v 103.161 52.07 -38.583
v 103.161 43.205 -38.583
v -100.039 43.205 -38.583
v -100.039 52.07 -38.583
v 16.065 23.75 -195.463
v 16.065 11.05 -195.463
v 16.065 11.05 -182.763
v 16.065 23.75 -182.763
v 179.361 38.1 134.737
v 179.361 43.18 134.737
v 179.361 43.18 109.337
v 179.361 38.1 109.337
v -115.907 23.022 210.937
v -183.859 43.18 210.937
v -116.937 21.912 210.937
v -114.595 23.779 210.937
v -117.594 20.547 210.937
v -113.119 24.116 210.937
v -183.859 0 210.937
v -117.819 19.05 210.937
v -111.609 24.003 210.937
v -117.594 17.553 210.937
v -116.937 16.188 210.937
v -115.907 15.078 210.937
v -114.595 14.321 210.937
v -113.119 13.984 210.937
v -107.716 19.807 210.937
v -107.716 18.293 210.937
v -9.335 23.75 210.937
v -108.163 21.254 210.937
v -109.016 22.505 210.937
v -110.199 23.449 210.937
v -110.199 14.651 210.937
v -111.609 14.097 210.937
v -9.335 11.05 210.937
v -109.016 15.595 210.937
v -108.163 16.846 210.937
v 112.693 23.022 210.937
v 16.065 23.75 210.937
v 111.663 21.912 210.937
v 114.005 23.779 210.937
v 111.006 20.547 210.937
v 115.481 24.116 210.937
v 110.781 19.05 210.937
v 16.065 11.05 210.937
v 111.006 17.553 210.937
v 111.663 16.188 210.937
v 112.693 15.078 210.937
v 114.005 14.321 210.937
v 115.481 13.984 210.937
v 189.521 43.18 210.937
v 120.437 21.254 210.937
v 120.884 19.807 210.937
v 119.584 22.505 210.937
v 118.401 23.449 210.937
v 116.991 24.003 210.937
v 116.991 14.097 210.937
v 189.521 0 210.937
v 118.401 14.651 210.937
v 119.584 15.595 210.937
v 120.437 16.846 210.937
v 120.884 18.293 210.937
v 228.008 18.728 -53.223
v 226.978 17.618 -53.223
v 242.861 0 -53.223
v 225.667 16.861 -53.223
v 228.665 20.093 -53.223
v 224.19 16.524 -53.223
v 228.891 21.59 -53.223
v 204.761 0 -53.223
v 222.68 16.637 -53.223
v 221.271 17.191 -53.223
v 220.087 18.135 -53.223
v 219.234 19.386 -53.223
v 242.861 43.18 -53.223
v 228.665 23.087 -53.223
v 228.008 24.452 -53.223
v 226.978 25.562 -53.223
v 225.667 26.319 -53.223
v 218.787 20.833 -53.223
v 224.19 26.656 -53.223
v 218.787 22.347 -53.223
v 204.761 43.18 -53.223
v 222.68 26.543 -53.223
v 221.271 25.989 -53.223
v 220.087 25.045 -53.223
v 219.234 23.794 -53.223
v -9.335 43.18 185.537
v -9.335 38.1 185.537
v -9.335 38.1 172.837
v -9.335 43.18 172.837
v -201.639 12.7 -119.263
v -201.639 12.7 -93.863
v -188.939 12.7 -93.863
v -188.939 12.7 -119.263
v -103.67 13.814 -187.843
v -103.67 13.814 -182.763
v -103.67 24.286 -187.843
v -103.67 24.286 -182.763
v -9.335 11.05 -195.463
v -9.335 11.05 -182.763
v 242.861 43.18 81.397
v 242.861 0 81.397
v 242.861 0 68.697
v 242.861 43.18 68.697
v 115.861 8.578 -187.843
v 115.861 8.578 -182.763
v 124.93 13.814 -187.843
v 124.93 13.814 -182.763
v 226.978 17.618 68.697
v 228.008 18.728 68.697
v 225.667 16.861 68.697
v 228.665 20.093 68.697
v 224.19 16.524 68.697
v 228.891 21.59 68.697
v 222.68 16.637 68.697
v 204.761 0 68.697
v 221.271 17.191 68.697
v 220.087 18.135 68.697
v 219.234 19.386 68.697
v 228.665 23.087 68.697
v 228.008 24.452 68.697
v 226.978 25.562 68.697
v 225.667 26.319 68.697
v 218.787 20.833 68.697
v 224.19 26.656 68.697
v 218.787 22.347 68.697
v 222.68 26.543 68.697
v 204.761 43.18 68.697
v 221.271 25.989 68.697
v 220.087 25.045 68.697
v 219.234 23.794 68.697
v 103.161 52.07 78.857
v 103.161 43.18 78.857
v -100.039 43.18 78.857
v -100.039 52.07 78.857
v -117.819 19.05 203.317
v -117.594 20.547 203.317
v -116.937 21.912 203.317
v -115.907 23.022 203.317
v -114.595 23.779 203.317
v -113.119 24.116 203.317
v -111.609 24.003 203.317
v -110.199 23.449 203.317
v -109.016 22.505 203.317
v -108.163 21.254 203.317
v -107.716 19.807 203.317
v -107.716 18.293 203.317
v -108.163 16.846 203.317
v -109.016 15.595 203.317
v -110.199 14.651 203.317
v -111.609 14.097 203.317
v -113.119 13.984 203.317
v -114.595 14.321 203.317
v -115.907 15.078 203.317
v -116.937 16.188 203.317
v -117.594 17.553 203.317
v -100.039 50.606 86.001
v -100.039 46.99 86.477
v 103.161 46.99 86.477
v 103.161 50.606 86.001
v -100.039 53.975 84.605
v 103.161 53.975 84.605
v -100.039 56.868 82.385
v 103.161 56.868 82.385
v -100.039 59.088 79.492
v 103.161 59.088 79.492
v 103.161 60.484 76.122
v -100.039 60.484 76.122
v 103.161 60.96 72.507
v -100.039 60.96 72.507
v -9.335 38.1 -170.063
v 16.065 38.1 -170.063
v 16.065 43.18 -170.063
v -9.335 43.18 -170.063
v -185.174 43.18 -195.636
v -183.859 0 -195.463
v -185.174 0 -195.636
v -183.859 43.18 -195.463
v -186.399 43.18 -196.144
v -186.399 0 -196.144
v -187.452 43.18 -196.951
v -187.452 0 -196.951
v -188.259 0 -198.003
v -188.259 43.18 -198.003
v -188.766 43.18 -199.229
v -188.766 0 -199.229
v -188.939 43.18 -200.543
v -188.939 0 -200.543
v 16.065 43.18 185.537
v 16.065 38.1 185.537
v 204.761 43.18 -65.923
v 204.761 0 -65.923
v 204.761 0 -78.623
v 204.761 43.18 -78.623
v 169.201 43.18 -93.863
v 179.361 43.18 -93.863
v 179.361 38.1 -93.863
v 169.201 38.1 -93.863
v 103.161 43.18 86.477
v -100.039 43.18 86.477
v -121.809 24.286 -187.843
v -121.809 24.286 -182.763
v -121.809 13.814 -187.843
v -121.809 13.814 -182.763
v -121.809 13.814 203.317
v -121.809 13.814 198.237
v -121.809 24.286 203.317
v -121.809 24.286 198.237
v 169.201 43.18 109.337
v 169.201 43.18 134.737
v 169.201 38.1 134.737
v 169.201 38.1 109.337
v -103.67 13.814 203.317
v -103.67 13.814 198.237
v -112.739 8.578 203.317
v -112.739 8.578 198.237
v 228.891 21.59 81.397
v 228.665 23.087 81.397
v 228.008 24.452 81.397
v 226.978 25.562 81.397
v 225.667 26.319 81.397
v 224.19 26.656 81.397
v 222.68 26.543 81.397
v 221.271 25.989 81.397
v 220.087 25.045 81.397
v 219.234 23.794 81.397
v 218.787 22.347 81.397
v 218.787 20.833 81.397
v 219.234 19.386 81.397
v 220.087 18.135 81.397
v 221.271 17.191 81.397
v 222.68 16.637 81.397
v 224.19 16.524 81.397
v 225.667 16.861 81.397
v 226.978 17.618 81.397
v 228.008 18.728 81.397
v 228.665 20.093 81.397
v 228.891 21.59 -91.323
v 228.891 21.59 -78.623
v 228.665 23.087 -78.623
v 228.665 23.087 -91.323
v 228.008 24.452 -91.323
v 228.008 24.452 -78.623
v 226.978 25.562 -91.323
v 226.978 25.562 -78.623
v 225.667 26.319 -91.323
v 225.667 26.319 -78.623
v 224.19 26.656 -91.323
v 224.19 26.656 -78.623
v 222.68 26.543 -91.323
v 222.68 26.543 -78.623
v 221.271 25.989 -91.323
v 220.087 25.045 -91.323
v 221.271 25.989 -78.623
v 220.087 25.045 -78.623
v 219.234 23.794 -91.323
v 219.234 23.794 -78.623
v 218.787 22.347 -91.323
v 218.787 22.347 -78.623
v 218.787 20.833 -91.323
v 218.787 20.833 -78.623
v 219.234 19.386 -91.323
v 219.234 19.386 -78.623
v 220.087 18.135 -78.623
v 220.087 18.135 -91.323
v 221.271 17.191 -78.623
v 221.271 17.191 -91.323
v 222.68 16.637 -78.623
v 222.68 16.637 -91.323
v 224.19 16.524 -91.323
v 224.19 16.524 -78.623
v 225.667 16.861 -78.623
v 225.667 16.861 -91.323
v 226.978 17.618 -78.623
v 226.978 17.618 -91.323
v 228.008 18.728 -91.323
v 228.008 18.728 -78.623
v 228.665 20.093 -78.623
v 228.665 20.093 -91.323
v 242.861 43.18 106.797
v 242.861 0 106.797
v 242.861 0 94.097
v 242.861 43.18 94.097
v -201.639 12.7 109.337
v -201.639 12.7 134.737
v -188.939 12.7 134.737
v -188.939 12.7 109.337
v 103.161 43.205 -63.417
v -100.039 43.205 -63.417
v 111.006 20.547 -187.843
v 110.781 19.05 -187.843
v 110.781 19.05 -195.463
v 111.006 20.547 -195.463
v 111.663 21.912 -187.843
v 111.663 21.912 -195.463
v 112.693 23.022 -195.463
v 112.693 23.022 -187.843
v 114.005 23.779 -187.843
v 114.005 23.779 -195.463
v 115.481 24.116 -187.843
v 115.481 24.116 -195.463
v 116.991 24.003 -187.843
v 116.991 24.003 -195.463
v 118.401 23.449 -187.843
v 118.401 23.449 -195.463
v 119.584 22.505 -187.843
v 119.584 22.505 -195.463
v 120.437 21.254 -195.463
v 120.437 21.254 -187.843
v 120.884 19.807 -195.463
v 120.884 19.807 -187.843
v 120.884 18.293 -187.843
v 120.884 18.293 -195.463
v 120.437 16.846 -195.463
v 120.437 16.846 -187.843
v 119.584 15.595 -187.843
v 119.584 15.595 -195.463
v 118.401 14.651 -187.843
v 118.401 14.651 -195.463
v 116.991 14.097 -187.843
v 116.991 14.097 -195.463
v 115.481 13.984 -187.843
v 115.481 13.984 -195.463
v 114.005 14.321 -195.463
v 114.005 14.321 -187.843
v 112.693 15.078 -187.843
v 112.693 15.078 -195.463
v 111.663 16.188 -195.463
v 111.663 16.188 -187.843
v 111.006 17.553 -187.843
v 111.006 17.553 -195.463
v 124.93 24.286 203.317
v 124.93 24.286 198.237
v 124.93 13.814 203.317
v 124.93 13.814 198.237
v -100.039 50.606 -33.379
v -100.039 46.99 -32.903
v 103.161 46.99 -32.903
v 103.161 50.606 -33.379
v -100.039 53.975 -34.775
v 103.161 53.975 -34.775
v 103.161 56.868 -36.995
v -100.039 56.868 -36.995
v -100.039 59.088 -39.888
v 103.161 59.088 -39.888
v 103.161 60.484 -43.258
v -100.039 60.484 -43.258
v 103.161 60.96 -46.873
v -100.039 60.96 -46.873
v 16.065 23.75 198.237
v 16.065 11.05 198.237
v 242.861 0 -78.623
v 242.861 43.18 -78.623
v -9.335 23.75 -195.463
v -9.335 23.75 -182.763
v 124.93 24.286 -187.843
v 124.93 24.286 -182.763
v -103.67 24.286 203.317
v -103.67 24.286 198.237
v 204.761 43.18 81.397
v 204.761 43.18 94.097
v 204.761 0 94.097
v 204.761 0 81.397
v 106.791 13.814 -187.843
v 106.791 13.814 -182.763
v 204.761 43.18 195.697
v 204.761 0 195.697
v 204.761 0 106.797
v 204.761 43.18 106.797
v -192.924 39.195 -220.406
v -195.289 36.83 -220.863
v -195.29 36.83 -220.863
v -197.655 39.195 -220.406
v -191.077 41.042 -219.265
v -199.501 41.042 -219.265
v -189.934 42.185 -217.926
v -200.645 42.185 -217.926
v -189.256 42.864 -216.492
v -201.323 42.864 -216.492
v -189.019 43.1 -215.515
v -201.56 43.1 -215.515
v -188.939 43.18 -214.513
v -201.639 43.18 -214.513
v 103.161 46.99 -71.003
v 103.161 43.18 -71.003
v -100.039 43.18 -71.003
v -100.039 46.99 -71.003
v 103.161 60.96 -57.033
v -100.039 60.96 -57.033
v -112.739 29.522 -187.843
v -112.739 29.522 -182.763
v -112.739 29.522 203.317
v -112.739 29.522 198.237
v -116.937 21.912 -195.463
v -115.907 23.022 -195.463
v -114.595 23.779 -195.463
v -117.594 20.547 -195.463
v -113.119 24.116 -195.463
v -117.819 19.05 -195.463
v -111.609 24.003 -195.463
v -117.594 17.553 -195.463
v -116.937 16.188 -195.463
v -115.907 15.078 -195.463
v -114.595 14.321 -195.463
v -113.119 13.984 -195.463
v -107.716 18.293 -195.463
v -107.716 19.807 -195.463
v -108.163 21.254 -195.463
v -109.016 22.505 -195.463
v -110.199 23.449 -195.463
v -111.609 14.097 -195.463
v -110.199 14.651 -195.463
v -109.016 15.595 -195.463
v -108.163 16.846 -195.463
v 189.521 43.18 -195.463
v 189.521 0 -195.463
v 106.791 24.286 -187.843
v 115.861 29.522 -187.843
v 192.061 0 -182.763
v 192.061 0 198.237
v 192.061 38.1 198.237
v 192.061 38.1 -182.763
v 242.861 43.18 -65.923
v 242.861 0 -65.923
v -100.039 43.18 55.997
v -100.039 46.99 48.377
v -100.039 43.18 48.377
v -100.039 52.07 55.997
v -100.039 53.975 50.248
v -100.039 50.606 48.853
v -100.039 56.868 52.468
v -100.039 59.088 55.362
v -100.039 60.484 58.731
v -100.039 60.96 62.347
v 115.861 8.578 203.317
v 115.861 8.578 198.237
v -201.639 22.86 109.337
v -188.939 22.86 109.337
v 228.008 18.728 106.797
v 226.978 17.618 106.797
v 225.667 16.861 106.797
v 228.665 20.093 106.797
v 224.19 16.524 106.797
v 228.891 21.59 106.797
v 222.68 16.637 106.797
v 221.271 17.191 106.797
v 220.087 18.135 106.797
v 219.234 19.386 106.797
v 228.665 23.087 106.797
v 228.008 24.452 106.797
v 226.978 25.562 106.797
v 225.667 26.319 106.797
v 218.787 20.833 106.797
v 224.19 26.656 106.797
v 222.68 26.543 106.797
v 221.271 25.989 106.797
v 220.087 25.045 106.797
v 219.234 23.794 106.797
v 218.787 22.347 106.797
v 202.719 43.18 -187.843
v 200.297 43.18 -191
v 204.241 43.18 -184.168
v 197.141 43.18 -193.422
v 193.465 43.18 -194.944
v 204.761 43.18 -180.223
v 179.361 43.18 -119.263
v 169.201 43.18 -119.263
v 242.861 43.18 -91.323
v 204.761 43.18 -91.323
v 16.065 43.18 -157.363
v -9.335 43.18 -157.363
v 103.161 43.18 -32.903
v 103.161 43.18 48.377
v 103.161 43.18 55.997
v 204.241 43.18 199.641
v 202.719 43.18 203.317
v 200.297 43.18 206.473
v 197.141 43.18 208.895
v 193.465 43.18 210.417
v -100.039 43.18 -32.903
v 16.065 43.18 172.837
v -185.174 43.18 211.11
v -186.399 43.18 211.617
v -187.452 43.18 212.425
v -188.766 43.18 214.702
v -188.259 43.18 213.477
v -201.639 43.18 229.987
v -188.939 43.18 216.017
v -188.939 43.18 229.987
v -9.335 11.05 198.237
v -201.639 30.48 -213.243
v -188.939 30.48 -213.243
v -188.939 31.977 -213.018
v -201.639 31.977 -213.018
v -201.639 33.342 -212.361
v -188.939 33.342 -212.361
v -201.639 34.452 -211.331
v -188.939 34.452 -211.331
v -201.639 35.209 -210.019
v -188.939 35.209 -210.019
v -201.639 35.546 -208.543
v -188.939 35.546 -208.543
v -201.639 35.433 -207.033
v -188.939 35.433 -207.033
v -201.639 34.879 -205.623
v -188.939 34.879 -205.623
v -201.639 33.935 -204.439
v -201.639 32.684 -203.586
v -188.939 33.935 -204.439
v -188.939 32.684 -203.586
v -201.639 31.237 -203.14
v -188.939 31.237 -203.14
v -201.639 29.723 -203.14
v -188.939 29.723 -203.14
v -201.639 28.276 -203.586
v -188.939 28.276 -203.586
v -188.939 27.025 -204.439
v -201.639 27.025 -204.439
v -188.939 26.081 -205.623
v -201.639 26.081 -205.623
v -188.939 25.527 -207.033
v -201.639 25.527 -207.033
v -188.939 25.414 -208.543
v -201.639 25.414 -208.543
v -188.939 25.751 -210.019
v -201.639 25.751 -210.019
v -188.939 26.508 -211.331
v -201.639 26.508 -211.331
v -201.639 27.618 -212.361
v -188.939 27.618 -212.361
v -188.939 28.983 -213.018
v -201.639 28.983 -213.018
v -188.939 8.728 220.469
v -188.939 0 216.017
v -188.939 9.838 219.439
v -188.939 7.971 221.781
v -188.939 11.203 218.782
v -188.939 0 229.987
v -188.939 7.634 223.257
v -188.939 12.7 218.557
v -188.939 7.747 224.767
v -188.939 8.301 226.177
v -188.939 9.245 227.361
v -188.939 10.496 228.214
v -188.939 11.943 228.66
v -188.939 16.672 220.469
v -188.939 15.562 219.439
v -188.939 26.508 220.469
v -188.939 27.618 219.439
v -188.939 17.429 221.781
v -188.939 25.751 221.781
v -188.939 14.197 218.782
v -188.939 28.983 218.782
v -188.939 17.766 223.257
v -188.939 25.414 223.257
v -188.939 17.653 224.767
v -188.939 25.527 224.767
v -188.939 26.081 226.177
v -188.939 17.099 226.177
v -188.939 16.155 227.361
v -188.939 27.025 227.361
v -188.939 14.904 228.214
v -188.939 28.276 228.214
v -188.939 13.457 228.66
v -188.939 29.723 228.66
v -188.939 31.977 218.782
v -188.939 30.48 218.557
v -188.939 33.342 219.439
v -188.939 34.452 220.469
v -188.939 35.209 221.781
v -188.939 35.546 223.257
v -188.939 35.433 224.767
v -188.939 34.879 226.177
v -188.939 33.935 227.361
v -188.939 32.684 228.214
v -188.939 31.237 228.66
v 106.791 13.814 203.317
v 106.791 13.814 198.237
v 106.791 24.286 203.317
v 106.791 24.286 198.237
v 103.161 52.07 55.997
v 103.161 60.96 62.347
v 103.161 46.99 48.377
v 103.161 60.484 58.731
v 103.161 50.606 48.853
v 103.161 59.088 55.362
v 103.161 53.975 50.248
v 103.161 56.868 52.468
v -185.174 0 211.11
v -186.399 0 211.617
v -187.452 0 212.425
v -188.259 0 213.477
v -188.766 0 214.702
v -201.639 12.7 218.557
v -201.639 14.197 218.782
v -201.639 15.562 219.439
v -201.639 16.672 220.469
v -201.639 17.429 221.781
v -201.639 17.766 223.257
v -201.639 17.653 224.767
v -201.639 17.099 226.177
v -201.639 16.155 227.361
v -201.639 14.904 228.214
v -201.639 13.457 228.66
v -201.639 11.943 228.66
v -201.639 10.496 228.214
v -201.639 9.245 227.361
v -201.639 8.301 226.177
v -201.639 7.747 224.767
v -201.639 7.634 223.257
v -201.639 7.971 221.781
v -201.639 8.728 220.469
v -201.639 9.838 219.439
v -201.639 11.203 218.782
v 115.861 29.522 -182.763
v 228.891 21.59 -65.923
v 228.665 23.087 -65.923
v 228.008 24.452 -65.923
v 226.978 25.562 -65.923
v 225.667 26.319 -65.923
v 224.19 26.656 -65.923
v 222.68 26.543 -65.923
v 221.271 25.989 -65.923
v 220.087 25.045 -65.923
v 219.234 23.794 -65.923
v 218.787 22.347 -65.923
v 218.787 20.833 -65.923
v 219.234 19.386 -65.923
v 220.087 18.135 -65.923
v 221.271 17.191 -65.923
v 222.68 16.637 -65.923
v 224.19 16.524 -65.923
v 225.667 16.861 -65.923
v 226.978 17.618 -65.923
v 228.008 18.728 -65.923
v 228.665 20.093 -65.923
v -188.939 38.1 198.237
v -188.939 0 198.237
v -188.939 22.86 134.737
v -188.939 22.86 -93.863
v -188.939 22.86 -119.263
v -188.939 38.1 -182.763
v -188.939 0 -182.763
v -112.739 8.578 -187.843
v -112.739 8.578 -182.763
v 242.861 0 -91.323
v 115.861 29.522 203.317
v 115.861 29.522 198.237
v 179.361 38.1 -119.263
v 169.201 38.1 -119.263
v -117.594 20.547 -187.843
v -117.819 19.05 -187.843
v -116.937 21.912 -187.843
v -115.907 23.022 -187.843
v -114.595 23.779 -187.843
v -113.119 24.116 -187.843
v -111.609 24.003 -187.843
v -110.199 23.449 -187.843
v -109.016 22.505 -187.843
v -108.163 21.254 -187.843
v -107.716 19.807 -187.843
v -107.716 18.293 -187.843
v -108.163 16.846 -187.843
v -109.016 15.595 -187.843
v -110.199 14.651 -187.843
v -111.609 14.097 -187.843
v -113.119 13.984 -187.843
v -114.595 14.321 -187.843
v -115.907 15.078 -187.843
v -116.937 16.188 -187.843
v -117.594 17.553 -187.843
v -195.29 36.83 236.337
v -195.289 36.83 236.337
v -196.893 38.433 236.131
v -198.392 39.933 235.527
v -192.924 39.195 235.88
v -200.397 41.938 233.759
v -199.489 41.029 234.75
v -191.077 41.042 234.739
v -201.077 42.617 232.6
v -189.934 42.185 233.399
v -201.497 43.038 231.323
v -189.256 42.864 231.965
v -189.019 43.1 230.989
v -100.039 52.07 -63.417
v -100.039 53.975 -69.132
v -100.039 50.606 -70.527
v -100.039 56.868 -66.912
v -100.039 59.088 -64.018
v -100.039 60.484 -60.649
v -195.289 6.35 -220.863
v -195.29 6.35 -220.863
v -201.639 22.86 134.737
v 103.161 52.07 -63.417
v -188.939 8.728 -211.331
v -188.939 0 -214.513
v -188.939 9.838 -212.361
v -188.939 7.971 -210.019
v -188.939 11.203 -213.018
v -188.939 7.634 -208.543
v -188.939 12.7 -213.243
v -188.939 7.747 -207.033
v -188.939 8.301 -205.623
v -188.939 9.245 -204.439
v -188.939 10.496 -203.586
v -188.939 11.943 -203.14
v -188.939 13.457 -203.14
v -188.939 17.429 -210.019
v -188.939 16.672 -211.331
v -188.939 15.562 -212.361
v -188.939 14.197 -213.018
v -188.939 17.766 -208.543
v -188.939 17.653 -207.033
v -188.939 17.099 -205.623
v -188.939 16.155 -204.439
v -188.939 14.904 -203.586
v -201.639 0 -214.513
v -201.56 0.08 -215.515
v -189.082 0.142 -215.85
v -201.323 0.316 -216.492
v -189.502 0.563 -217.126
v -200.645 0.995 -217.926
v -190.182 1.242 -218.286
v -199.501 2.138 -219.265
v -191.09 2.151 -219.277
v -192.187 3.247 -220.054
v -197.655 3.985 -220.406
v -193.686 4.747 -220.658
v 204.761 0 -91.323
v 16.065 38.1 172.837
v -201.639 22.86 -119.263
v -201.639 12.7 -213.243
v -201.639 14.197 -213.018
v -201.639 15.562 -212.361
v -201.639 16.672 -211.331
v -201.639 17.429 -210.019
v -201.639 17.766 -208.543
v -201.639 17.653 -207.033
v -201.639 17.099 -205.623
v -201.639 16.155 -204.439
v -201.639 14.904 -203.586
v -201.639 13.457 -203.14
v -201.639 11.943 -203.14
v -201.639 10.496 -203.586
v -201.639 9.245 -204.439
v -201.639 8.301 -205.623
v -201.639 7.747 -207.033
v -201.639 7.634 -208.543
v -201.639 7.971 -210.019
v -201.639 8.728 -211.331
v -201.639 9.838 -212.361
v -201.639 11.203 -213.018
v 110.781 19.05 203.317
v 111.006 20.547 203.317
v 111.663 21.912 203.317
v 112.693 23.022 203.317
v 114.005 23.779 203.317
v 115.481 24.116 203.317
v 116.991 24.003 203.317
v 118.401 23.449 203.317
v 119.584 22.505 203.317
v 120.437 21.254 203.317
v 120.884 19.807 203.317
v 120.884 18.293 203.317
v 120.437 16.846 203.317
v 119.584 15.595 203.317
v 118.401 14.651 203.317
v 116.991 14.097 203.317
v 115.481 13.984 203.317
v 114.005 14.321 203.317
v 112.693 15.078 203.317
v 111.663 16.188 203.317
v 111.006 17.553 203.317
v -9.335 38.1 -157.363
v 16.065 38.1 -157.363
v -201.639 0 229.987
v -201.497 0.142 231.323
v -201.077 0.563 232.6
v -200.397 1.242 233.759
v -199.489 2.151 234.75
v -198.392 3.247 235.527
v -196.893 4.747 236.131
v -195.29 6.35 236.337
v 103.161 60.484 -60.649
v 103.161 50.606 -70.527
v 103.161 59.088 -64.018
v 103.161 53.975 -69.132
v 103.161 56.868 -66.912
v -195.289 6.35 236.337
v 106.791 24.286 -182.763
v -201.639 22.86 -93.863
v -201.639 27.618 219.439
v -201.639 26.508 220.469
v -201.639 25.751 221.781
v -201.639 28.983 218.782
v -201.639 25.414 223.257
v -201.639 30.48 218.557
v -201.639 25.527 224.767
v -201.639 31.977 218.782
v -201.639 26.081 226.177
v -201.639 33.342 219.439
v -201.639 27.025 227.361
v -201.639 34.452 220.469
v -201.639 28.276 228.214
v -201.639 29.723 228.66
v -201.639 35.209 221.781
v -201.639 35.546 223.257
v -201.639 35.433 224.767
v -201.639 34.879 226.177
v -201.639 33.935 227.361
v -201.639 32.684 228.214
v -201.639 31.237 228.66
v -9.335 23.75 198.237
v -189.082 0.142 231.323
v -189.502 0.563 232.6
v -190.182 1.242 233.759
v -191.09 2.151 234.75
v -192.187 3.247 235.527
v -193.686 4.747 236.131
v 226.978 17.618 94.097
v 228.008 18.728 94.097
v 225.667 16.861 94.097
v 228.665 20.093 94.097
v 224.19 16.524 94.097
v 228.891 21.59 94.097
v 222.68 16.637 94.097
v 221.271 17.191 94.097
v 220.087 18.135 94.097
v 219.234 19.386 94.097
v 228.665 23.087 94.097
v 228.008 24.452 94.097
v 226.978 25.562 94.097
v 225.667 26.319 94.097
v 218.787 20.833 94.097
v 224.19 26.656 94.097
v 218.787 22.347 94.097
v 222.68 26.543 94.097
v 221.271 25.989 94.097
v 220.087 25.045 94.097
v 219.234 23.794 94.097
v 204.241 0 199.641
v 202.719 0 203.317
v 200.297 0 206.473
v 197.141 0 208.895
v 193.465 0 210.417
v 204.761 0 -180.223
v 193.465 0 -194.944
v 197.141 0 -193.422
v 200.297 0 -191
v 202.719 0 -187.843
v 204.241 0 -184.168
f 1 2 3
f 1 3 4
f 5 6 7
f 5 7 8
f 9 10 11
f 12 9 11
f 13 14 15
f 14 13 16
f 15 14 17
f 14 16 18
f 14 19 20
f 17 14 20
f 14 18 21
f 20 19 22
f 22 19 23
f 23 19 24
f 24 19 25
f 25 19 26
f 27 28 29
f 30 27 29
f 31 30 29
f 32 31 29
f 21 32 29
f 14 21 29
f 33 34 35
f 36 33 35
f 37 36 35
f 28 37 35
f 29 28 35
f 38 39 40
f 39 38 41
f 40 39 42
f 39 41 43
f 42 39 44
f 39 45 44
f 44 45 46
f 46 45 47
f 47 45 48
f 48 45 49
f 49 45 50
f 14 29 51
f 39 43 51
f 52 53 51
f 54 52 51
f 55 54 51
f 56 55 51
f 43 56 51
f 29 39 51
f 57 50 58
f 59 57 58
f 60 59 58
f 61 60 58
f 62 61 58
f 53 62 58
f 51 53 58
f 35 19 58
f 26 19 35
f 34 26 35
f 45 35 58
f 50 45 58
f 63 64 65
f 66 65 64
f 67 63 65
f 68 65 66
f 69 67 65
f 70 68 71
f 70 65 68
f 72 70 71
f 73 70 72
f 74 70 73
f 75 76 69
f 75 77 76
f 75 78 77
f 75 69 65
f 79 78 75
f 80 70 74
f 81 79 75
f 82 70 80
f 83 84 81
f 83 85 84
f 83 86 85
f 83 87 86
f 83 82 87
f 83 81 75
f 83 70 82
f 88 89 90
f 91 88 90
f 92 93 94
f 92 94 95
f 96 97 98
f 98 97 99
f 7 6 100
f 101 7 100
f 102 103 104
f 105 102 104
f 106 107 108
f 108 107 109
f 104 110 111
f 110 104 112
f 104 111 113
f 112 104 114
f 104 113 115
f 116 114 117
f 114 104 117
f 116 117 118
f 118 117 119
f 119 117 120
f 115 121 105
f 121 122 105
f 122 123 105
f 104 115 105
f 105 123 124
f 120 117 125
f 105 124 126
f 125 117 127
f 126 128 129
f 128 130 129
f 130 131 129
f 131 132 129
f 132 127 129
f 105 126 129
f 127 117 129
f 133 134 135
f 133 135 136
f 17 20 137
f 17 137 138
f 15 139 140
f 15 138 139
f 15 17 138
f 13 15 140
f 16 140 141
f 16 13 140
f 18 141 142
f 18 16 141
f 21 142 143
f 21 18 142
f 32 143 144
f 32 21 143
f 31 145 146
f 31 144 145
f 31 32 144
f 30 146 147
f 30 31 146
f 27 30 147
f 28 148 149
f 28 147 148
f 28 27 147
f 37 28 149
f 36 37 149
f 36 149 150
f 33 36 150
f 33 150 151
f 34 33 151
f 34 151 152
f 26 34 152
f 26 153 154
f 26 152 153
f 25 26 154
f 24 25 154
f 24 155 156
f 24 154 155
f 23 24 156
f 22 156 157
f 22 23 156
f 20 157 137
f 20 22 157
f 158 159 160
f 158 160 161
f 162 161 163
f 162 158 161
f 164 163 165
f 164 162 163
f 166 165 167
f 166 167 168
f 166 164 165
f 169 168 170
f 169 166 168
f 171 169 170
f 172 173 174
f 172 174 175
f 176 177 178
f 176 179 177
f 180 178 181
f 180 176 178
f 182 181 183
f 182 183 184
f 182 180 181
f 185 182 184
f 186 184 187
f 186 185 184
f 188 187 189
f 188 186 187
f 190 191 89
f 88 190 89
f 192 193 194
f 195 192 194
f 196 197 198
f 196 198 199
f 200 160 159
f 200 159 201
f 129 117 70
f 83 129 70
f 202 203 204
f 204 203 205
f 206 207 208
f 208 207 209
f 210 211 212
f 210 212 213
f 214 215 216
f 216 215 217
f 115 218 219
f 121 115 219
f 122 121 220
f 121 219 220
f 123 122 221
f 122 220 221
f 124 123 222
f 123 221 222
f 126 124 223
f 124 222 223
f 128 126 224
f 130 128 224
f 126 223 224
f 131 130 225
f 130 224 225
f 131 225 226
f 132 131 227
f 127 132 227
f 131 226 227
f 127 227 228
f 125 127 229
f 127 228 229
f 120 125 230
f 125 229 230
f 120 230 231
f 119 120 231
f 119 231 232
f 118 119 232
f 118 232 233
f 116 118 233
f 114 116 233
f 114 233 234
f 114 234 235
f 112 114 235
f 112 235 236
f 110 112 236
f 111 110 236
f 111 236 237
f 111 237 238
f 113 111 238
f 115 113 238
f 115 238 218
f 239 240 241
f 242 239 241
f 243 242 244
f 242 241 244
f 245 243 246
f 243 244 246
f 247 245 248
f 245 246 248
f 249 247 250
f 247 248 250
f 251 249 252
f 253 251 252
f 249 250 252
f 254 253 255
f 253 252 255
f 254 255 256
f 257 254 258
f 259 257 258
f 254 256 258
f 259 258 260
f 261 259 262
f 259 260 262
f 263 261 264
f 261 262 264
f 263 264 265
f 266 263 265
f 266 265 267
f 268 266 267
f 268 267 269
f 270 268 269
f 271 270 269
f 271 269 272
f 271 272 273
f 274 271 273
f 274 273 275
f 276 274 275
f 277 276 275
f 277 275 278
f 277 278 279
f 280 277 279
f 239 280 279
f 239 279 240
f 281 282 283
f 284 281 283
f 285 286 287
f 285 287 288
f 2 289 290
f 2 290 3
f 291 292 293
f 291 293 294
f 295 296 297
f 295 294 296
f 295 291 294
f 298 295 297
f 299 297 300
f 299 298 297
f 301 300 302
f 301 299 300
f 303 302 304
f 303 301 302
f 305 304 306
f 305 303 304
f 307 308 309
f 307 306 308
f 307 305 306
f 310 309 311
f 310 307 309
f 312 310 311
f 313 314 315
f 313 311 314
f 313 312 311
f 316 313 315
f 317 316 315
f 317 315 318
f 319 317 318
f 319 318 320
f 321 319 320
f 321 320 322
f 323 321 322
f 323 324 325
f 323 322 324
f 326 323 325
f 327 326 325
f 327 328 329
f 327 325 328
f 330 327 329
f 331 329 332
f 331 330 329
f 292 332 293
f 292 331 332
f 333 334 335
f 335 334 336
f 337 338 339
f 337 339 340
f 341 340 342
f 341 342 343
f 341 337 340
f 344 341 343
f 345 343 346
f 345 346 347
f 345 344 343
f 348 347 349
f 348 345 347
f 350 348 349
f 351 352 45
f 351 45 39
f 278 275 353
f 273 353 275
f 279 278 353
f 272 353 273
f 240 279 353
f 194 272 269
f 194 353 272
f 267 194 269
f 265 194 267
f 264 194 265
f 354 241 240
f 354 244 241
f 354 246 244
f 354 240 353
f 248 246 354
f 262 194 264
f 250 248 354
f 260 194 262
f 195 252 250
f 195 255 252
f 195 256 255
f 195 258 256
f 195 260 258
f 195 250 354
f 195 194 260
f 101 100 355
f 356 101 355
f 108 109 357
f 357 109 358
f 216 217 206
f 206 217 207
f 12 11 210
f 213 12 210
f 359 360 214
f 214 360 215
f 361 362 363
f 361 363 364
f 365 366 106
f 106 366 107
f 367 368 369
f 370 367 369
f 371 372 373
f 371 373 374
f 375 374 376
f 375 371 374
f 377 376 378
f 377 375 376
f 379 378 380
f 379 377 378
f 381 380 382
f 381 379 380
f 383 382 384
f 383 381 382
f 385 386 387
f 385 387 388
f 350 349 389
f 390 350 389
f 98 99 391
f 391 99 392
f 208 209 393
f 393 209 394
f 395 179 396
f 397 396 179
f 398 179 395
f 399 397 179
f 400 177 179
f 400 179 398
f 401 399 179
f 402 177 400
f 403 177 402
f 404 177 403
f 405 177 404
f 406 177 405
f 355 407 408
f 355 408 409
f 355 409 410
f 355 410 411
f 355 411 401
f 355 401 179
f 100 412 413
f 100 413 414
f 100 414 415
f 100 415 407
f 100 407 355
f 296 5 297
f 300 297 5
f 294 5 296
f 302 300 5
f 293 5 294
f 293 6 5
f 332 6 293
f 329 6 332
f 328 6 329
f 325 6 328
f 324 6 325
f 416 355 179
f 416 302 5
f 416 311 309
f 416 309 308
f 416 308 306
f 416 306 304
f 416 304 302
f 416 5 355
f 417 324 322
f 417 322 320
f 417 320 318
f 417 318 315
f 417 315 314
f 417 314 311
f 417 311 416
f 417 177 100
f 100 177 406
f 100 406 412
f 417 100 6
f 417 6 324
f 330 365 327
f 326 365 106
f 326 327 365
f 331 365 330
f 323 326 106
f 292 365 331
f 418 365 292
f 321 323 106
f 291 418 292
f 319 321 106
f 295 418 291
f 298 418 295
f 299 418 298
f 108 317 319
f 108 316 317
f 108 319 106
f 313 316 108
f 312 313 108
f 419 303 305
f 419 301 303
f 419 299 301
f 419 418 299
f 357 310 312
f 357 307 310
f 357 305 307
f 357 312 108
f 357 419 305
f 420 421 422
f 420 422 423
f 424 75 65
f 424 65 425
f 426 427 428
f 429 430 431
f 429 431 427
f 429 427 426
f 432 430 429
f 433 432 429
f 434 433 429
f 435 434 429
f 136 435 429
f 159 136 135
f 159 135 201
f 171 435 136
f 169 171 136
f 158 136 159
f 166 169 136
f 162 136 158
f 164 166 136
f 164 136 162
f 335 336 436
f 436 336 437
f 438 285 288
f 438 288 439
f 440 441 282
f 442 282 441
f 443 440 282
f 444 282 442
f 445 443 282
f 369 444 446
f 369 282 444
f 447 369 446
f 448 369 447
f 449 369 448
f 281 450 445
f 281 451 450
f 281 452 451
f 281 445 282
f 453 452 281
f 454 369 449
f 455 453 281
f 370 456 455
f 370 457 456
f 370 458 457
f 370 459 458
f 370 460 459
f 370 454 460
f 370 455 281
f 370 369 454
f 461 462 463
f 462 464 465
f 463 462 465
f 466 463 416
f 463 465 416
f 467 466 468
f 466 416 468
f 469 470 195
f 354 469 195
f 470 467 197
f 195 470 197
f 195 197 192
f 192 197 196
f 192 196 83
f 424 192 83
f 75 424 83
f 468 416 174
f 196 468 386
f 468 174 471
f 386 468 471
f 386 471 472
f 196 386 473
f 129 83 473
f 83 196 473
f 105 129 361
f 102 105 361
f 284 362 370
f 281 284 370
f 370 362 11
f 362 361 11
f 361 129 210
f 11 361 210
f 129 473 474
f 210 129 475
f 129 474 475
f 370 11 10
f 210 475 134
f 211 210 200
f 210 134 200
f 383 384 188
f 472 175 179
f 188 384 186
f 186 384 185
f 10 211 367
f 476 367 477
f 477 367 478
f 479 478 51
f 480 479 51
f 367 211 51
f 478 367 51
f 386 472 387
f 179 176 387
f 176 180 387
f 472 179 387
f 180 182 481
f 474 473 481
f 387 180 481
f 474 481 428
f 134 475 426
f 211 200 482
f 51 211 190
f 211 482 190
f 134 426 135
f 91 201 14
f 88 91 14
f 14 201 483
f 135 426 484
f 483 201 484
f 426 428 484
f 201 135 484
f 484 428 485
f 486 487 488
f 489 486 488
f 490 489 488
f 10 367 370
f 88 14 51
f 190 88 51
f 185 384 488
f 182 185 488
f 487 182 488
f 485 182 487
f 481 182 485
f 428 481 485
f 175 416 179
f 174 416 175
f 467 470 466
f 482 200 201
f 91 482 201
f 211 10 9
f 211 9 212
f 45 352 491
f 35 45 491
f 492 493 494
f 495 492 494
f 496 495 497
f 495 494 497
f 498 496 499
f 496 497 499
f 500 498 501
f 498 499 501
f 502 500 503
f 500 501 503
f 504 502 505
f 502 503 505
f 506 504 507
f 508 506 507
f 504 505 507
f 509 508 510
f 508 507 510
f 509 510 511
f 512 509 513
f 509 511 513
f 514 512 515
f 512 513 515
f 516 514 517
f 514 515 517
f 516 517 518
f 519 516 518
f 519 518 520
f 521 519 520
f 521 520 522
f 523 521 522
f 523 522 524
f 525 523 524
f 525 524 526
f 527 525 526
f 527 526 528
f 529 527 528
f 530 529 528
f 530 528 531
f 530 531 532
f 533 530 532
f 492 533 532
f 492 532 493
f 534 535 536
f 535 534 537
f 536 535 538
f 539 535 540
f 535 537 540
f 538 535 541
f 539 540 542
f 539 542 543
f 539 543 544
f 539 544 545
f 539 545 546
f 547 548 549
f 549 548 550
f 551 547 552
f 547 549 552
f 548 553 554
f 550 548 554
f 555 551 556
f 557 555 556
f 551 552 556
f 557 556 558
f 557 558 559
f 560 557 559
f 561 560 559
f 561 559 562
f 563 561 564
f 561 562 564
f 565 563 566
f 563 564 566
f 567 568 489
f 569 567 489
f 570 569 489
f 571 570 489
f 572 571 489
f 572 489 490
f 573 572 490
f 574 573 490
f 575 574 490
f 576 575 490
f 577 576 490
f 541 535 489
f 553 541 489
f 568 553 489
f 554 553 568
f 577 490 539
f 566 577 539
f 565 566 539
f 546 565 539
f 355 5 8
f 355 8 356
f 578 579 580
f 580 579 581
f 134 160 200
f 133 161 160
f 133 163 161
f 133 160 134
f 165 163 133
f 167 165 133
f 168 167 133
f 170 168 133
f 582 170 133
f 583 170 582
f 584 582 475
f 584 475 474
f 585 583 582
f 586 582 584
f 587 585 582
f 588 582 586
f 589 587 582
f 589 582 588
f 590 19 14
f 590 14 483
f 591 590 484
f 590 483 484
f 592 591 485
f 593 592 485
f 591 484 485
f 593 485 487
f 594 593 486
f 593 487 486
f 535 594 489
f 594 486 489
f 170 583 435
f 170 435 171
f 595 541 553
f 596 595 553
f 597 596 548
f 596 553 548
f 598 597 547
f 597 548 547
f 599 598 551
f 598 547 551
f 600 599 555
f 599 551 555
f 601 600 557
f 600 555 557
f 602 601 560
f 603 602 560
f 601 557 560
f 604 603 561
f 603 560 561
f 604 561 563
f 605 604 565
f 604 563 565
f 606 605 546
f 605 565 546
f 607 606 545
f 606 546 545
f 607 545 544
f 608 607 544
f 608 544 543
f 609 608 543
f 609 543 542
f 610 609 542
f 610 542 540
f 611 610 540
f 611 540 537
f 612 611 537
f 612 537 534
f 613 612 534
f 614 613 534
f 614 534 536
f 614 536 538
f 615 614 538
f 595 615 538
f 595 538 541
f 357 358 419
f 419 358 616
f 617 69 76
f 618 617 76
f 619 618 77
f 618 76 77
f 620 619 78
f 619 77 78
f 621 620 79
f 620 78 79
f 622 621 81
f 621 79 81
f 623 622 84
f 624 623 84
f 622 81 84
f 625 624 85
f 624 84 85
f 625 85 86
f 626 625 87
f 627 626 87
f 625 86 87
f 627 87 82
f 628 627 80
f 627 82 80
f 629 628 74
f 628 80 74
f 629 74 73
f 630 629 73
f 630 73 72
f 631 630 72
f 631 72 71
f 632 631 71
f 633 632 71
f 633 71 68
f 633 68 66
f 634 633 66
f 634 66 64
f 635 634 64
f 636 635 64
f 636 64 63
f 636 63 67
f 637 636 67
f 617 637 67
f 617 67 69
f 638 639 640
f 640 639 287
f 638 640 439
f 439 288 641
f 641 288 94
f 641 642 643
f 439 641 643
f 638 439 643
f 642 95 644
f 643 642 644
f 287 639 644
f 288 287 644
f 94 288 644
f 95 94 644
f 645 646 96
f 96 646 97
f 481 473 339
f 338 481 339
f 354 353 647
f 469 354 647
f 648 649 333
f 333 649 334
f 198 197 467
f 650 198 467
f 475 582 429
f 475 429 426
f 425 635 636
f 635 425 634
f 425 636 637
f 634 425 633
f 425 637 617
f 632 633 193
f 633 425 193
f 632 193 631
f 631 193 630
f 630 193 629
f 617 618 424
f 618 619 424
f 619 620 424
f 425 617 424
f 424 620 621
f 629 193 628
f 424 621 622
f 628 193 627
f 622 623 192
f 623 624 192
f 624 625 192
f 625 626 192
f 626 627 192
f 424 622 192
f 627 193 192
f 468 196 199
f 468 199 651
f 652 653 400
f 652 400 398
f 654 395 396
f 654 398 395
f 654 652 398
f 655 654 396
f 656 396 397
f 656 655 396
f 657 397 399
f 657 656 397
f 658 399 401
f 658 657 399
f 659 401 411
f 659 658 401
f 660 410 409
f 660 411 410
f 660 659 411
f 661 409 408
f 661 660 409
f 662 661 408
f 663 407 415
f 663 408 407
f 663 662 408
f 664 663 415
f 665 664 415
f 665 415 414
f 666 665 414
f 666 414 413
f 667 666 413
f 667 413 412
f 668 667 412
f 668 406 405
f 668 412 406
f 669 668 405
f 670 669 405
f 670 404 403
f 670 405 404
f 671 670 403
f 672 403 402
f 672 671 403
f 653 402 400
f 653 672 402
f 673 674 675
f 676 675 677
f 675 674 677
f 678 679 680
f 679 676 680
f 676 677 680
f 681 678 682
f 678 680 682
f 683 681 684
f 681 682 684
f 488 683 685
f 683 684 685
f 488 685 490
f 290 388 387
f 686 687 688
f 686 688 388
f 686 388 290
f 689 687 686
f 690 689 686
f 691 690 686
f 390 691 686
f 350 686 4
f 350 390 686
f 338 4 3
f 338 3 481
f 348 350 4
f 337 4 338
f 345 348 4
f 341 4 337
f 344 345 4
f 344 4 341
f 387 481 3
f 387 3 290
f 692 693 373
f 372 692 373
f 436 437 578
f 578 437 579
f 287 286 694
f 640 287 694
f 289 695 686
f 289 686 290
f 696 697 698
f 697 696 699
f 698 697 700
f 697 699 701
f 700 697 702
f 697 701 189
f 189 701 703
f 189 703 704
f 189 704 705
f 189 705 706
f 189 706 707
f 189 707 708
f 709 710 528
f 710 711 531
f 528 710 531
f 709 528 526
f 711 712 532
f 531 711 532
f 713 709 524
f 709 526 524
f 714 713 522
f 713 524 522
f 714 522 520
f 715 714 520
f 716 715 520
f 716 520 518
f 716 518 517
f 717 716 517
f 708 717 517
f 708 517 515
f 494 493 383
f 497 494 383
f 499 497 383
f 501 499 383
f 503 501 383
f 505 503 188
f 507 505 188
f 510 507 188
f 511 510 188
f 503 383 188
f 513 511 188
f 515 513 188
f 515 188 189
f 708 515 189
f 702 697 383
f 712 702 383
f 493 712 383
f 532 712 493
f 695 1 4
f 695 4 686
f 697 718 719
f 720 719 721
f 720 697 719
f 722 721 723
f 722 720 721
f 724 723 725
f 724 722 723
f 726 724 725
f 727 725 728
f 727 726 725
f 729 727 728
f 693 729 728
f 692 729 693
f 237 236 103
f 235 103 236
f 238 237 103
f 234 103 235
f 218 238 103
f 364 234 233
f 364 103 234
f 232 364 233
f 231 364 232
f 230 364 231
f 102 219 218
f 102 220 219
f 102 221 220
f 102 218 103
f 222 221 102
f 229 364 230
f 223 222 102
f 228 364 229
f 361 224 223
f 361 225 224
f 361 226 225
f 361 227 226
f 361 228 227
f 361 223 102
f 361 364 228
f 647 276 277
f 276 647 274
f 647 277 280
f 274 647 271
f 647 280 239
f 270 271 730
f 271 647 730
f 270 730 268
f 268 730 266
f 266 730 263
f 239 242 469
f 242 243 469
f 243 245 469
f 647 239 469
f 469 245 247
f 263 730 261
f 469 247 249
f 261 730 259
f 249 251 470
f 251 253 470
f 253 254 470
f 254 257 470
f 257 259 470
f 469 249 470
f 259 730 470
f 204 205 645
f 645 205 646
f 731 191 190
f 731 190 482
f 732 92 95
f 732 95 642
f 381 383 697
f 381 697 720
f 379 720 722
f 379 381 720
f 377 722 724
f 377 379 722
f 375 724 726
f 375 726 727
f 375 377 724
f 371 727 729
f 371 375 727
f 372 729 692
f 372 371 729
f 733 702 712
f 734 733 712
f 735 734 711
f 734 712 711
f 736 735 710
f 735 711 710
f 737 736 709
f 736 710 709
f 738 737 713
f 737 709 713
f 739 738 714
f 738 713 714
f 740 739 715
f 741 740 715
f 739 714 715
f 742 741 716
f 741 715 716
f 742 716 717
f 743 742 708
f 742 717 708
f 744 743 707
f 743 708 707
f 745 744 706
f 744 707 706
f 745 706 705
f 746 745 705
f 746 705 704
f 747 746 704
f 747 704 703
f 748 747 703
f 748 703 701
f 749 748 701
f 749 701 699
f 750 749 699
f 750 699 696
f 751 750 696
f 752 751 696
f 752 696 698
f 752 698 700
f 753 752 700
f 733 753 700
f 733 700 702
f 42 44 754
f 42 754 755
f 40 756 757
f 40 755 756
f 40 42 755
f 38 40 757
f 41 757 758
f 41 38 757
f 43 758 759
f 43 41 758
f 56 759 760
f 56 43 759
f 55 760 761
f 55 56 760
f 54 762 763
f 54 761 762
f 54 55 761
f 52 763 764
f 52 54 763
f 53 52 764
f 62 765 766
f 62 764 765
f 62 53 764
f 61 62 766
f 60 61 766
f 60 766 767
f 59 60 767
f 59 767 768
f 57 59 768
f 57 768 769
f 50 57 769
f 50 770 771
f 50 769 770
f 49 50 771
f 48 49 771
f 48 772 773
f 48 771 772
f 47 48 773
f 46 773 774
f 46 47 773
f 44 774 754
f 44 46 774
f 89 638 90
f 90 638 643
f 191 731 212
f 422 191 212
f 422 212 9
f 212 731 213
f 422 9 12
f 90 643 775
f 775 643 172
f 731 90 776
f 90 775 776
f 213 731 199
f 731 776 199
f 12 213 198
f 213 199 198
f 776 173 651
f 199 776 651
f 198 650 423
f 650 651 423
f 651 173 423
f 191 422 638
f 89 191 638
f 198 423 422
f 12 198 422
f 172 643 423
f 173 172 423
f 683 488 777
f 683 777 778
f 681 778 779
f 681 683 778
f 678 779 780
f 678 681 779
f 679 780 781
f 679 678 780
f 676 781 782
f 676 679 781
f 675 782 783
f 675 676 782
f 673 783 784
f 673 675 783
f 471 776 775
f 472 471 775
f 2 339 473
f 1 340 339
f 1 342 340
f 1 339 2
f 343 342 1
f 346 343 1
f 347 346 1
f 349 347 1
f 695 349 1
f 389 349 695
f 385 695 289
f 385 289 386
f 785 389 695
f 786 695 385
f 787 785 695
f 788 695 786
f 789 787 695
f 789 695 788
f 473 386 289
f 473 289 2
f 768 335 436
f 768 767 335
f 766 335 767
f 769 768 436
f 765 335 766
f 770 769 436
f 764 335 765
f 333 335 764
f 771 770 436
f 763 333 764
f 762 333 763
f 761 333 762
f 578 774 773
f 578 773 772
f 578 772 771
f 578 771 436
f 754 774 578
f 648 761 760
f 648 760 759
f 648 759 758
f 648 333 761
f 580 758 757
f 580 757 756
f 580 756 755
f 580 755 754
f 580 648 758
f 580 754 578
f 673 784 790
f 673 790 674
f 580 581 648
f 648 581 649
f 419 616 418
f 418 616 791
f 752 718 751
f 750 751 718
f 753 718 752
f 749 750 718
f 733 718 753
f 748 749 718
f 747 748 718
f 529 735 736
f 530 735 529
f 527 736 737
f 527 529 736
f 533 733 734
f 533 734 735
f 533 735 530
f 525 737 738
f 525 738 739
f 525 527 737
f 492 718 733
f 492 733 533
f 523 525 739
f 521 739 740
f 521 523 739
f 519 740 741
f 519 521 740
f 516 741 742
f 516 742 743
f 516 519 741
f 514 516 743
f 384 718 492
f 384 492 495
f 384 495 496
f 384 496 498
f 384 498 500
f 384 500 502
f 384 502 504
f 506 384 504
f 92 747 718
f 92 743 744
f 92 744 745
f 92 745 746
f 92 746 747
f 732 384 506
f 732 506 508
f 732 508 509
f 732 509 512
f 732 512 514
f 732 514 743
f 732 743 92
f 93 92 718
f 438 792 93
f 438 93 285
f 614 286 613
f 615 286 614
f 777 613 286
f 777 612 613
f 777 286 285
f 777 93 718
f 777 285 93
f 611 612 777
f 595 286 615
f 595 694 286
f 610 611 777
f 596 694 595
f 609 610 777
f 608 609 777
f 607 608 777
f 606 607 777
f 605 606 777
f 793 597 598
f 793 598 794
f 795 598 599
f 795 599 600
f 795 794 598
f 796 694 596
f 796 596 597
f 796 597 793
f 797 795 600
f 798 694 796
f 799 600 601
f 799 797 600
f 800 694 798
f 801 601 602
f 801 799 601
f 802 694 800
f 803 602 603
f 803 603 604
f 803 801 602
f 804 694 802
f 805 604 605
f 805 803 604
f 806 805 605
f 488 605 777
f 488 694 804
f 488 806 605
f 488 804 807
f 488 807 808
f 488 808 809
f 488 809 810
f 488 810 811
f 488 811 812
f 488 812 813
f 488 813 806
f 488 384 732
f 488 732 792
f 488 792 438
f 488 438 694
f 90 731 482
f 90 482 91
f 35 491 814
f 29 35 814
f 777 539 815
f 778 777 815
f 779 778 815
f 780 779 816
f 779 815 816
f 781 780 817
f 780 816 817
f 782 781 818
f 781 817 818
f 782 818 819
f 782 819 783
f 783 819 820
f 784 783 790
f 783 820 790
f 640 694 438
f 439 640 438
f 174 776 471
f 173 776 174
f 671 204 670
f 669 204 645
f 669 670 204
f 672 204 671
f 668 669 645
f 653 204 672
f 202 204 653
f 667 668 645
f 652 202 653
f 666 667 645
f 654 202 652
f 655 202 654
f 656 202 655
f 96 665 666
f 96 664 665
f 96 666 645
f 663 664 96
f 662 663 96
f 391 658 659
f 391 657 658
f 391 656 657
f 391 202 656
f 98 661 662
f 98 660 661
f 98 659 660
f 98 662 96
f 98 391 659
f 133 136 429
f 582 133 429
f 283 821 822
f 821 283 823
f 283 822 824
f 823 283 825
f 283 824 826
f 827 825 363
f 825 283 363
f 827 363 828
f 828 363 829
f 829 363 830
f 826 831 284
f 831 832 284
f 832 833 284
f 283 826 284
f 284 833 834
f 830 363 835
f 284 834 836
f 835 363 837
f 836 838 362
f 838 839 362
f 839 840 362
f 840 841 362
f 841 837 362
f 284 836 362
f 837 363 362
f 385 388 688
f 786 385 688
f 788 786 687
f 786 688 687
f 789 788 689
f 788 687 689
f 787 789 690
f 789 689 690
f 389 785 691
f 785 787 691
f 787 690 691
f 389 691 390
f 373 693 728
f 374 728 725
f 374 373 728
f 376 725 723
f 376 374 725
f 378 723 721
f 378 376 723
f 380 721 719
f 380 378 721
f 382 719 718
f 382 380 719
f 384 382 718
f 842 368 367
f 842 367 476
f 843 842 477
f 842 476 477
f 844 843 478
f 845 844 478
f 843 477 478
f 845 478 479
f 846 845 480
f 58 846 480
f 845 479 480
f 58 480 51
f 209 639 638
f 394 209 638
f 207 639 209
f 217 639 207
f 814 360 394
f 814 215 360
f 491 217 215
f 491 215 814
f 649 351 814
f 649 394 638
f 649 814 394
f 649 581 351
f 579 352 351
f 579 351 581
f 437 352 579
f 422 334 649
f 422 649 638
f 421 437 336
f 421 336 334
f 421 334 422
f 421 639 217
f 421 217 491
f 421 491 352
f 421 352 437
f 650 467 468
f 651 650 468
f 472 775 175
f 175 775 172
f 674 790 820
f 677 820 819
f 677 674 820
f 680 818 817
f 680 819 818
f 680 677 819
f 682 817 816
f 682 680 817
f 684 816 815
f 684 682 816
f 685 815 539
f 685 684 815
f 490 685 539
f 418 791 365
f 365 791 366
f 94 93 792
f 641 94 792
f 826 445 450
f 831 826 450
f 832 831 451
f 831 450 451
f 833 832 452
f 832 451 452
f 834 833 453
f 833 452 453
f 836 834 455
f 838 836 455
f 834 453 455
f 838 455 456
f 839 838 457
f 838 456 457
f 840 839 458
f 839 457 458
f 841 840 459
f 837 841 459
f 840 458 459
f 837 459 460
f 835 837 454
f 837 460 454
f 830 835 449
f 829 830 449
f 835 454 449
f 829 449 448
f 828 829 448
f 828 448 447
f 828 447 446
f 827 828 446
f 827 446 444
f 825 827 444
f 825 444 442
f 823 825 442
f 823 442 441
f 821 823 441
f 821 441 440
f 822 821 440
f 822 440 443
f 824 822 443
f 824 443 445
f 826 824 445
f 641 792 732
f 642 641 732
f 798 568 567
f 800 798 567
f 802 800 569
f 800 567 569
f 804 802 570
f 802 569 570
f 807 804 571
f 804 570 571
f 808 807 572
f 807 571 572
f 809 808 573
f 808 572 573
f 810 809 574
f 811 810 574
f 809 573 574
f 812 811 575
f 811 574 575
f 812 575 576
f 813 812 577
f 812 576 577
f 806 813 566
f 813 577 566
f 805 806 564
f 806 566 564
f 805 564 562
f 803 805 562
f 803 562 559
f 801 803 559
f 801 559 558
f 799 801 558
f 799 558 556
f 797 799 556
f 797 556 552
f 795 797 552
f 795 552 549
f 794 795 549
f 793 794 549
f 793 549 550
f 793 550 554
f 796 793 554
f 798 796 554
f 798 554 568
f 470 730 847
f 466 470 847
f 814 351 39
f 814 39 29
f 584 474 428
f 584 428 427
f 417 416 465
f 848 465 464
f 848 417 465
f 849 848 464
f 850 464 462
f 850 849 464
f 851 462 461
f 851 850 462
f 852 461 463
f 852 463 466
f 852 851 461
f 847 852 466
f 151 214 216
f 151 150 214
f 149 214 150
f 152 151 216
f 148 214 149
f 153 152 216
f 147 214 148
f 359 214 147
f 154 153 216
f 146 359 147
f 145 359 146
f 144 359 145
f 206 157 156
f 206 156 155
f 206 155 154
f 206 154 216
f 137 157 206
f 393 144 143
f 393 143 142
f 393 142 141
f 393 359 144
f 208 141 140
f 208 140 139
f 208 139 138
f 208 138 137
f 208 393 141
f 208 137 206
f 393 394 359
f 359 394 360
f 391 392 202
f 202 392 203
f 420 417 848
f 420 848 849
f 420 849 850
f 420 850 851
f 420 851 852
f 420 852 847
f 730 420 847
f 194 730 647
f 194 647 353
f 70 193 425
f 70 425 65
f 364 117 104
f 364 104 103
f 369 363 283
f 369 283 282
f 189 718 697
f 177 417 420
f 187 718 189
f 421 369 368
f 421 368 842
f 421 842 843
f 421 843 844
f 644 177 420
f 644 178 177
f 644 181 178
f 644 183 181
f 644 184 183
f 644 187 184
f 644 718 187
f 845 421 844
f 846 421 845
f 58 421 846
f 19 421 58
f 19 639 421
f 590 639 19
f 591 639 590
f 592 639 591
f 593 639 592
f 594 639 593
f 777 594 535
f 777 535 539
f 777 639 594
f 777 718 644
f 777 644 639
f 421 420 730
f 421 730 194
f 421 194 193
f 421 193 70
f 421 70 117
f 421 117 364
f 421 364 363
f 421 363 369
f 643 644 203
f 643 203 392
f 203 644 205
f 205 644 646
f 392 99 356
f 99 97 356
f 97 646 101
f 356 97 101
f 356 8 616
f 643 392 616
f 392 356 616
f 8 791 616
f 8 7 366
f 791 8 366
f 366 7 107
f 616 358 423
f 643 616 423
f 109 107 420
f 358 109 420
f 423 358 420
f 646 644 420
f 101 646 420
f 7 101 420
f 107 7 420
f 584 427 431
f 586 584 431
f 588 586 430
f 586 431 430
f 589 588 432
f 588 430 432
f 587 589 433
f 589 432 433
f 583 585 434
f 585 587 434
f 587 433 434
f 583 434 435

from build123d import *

# Parameters (mm, degrees)
SKETCH1_W                = 406.4
SKETCH1_H                = 406.4
SKETCH1_W_2              = 381
SKETCH1_H_2              = 381
BOSS_EXTRUDE2_DEPTH      = 38.1
SKETCH2_W                = 406.4
SKETCH2_H                = 406.4
BOSS_EXTRUDE3_DEPTH      = 5.08
CUT_EXTRUDE3_DEPTH       = 5.08
CUT_EXTRUDE4_DEPTH       = 446.859951222
CUT_EXTRUDE4_DEPTH_BACK  = 446.859951222
SKETCH6_R                = 5.08
CUT_EXTRUDE6_DEPTH       = 5.08
SKETCH8_W                = 457.2
SKETCH8_H                = 43.18
BOSS_EXTRUDE4_DEPTH      = 12.7
SKETCH9_R                = 5.08
CUT_EXTRUDE7_DEPTH       = 462.214953622
FILLET2_R                = 15.24
FILLET3_R                = 5.08
FILLET4_R                = 6.35
CUT_EXTRUDE8_DEPTH       = 473.102217157
CUT_EXTRUDE8_DEPTH_BACK  = 473.102217157
SKETCH10_W               = 25.4
SKETCH10_H               = 10.16
CUT_EXTRUDE9_DEPTH       = 316.013546928
CUT_EXTRUDE9_DEPTH_BACK  = 316.013546928
SKETCH11_W               = 10.16
SKETCH11_H               = 25.4
SKETCH13_W               = 38.1
SKETCH13_H               = 17.78
BOSS_EXTRUDE6_DEPTH      = 406.4
FILLET5_R                = 13.97
CUT_EXTRUDE10_DEPTH      = 475.059186858
CUT_EXTRUDE10_DEPTH_BACK = 101.6
SKETCH14_W               = 157.48
SKETCH14_H               = 20.829558228
SKETCH17_W               = 157.48
SKETCH17_H               = 21.78032637
CUT_EXTRUDE11_DEPTH      = 101.6
BOSS_EXTRUDE7_START      = -12.7
SKETCH18_W               = 375.92
SKETCH18_H               = 43.18
BOSS_EXTRUDE7_DEPTH      = 12.7
SKETCH19_W               = 12.7
SKETCH19_H               = 43.18
BOSS_EXTRUDE8_DEPTH      = 38.1
SKETCH20_R               = 5.08
CUT_EXTRUDE12_DEPTH      = 413.381445795
SKETCH21_W               = 23.212308842
SKETCH21_H               = 297.780762004
BOSS_EXTRUDE10_DEPTH     = 5.08
SKETCH22_W               = 25.4
SKETCH22_H               = 12.7
CUT_EXTRUDE13_DEPTH      = 500.147895153
SKETCH23_W               = 25.4
SKETCH23_H               = 12.7
CUT_EXTRUDE14_DEPTH      = 342.010118149


with BuildPart() as part:
    # Sketch1 → Boss-Extrude2 (new body)
    with BuildSketch(Plane(origin=(0, 0, 0), x_dir=(1, 0, 0), z_dir=(0, 1, 0))):
        with Locations((1.560576536, -7.736690009)):
            Rectangle(SKETCH1_W, SKETCH1_H)
        with Locations((1.560576536, -7.736690009)):
            Rectangle(SKETCH1_W_2, SKETCH1_H_2, mode=Mode.SUBTRACT)
    extrude(amount=BOSS_EXTRUDE2_DEPTH)

    # Sketch2 → Boss-Extrude3 (add)
    with BuildSketch(Plane(origin=(0, 38.1, 0), x_dir=(1, 0, 0), z_dir=(0, 1, 0))):
        with Locations((1.560576536, -7.736690009)):
            Rectangle(SKETCH2_W, SKETCH2_H)
    extrude(amount=BOSS_EXTRUDE3_DEPTH)

    # Sketch5 → Cut-Extrude3 (cut)
    with BuildSketch(Plane(origin=(0, 0, 198.236690009), x_dir=(-1, 0, 0), z_dir=(0, 0, -1))):
        Polygon((-115.860576536, 8.577585816), (-106.791199814, 13.813792908), (-106.791199814, 24.286207092), (-115.860576536, 29.522414184), (-124.929953259, 24.286207092), (-124.929953259, 13.813792908), align=None)
        Polygon((112.739423464, 29.522414184), (103.670046741, 24.286207092), (103.670046741, 13.813792908), (112.739423464, 8.577585816), (121.808800186, 13.813792908), (121.808800186, 24.286207092), align=None)
    extrude(amount=-CUT_EXTRUDE3_DEPTH, mode=Mode.SUBTRACT)

    # Sketch6 → Cut-Extrude4 (cut, two sides: drawn at the far end of the back side and taken through both)
    with BuildSketch(Plane(origin=(0, 0, 198.236690009), x_dir=(-1, 0, 0), z_dir=(0, 0, -1)).offset(-CUT_EXTRUDE4_DEPTH_BACK)):
        with Locations((-115.860576536, 19.05)):
            Circle(SKETCH6_R)
        with Locations((112.739423464, 19.05)):
            Circle(SKETCH6_R)
    extrude(amount=CUT_EXTRUDE4_DEPTH + CUT_EXTRUDE4_DEPTH_BACK, mode=Mode.SUBTRACT)

    # Sketch7 → Cut-Extrude6 (cut)
    with BuildSketch(Plane.XY.offset(-182.763309991)):
        Polygon((-112.739423464, 29.522414184), (-121.808800186, 24.286207092), (-121.808800186, 13.813792908), (-112.739423464, 8.577585816), (-103.670046741, 13.813792908), (-103.670046741, 24.286207092), align=None)
        Polygon((115.860576536, 29.522414184), (106.791199814, 24.286207092), (106.791199814, 13.813792908), (115.860576536, 8.577585816), (124.929953259, 13.813792908), (124.929953259, 24.286207092), align=None)
    extrude(amount=-CUT_EXTRUDE6_DEPTH, mode=Mode.SUBTRACT)

    # Sketch8 → Boss-Extrude4 (add)
    with BuildSketch(Plane.ZY.offset(201.639423464)):
        with Locations((7.736690009, 21.59)):
            Rectangle(SKETCH8_W, SKETCH8_H)
    extrude(amount=-BOSS_EXTRUDE4_DEPTH)

    # Sketch9 → Cut-Extrude7 (cut, through all)
    with BuildSketch(Plane(origin=(-188.939423464, 0, 0), x_dir=(0, 0, -1), z_dir=(1, 0, 0))):
        with Locations((208.163309991, 30.48)):
            Circle(SKETCH9_R)
        with Locations((-223.636690009, 30.48)):
            Circle(SKETCH9_R)
        with Locations((-223.636690009, 12.7)):
            Circle(SKETCH9_R)
        with Locations((208.163309991, 12.7)):
            Circle(SKETCH9_R)
    extrude(amount=-CUT_EXTRUDE7_DEPTH, mode=Mode.SUBTRACT)

    # Fillet2
    fillet2_edges = [part.edges().sort_by_distance(p)[0] for p in [
        (204.760576536, 21.59, 210.936690009),
        (204.760576536, 21.59, -195.463309991),
    ]]
    fillet(fillet2_edges, radius=FILLET2_R)

    # Fillet3
    fillet3_edges = [part.edges().sort_by_distance(p)[0] for p in [
        (-188.939423464, 21.59, -195.463309991),
        (-188.939423464, 21.59, 210.936690009),
    ]]
    fillet(fillet3_edges, radius=FILLET3_R)

    # Fillet4
    fillet4_edges = [part.edges().sort_by_distance(p)[0] for p in [
        (-195.289423464, 43.18, -220.863309991),
        (-195.289423464, 0, 236.336690009),
        (-201.639423464, 21.59, -220.863309991),
        (-201.639423464, 21.59, 236.336690009),
        (-188.939423464, 21.59, -220.863309991),
        (-195.289423464, 0, -220.863309991),
        (-188.939423464, 21.59, 236.336690009),
        (-195.289423464, 43.18, 236.336690009),
    ]]
    fillet(fillet4_edges, radius=FILLET4_R - 0.0001)  # a hair under: the kernel refuses the full size

    # Sketch10 → Cut-Extrude8 (cut, two sides: drawn at the far end of the back side and taken through both)
    with BuildSketch(Plane(origin=(204.760576536, 0, 0), x_dir=(0, 0, -1), z_dir=(1, 0, 0)).offset(-CUT_EXTRUDE8_DEPTH_BACK)):
        with Locations((-122.036690009, 17.78)):
            Rectangle(SKETCH10_W, SKETCH10_H)
        with Locations((106.563309991, 17.78)):
            Rectangle(SKETCH10_W, SKETCH10_H)
    extrude(amount=CUT_EXTRUDE8_DEPTH + CUT_EXTRUDE8_DEPTH_BACK, mode=Mode.SUBTRACT)

    # Sketch11 → Cut-Extrude9 (cut, two sides: drawn at the far end of the back side and taken through both)
    with BuildSketch(Plane(origin=(0, 38.1, 0), x_dir=(-1, 0, 0), z_dir=(0, -1, 0)).offset(-CUT_EXTRUDE9_DEPTH_BACK)):
        with Locations((-174.280576536, -122.036690009)):
            Rectangle(SKETCH11_W, SKETCH11_H)
        with Locations((171.159423464, -122.036690009)):
            Rectangle(SKETCH11_W, SKETCH11_H)
        with Locations((-174.280576536, 106.563309991)):
            Rectangle(SKETCH11_W, SKETCH11_H)
        with Locations((171.159423464, 106.563309991)):
            Rectangle(SKETCH11_W, SKETCH11_H)
    extrude(amount=CUT_EXTRUDE9_DEPTH + CUT_EXTRUDE9_DEPTH_BACK, mode=Mode.SUBTRACT)

    # Sketch13 → Boss-Extrude6 (add, through all)
    # profile 1 of 2: a face of its own
    with BuildSketch(Plane(origin=(204.760576536, 0, 0), x_dir=(0, 0, -1), z_dir=(1, 0, 0))):
        Polygon((-86.476690009, 60.96), (-86.476690009, 43.18), (-78.856690009, 43.18), (-78.856690009, 47.73825334), (-78.856690009, 52.07), (-55.996690009, 52.07), (-55.996690009, 48.121507739), (-55.996690009, 43.18), (-48.376690009, 43.18), (-48.376690009, 60.96), align=None)
    # profile 2 of 2: a face of its own
    with BuildSketch(Plane(origin=(204.760576536, 0, 0), x_dir=(0, 0, -1), z_dir=(1, 0, 0))):
        with Locations((51.953309991, 52.07)):
            Rectangle(SKETCH13_W, SKETCH13_H)
        Polygon((38.583459735, 43.205405435), (38.583459735, 47.763658775), (38.583459735, 52.07), (63.41669047, 52.07), (63.41669047, 47.763658775), (63.41669047, 43.205405435), align=None, mode=Mode.SUBTRACT)
    extrude(amount=-BOSS_EXTRUDE6_DEPTH)

    # Fillet5
    fillet5_edges = [part.edges().sort_by_distance(p)[0] for p in [
        (1.560576536, 60.96, 86.476690009),
        (1.560576536, 60.96, 48.376690009),
        (1.560576536, 60.96, -32.903309991),
        (1.560576536, 60.96, -71.003309991),
    ]]
    fillet(fillet5_edges, radius=FILLET5_R)

    # Sketch14 → Cut-Extrude10 (cut, two sides: drawn at the far end of the back side and taken through both)
    with BuildSketch(Plane.ZY.offset(201.639423464).offset(-CUT_EXTRUDE10_DEPTH_BACK)):
        with Locations((7.736690009, 53.594779114)):
            Rectangle(SKETCH14_W, SKETCH14_H)
    extrude(amount=CUT_EXTRUDE10_DEPTH + CUT_EXTRUDE10_DEPTH_BACK, mode=Mode.SUBTRACT)

    # Sketch17 → Cut-Extrude11 (cut)
    with BuildSketch(Plane(origin=(204.760576536, 0, 0), x_dir=(0, 0, -1), z_dir=(1, 0, 0))):
        with Locations((-7.736690009, 54.070163185)):
            Rectangle(SKETCH17_W, SKETCH17_H)
    extrude(amount=-CUT_EXTRUDE11_DEPTH, mode=Mode.SUBTRACT)

    # Sketch18 → Boss-Extrude7 (add)
    with BuildSketch(Plane(origin=(204.760576536, 0, 0), x_dir=(0, 0, -1), z_dir=(1, 0, 0)).offset(BOSS_EXTRUDE7_START)):
        with Locations((-7.736690009, 21.59)):
            Rectangle(SKETCH18_W, SKETCH18_H)
    extrude(amount=BOSS_EXTRUDE7_DEPTH)

    # Sketch19 → Boss-Extrude8 (add)
    with BuildSketch(Plane(origin=(204.760576536, 0, 0), x_dir=(0, 0, -1), z_dir=(1, 0, 0))):
        with Locations((84.973309991, 21.59)):
            Rectangle(SKETCH19_W, SKETCH19_H)
        with Locations((-100.446690009, 21.59)):
            Rectangle(SKETCH19_W, SKETCH19_H)
        with Locations((59.573309991, 21.59)):
            Rectangle(SKETCH19_W, SKETCH19_H)
        with Locations((-75.046690009, 21.59)):
            Rectangle(SKETCH19_W, SKETCH19_H)
    extrude(amount=BOSS_EXTRUDE8_DEPTH)

    # Sketch20 → Cut-Extrude12 (cut, through all)
    with BuildSketch(Plane.XY.offset(106.796690009)):
        with Locations((223.810576536, 21.59)):
            Circle(SKETCH20_R)
    extrude(amount=-CUT_EXTRUDE12_DEPTH, mode=Mode.SUBTRACT)

    # Sketch21 → Boss-Extrude10 (add)
    with BuildSketch(Plane.XZ.offset(-38.1)):
        with Locations((-170.393564794, 16.358404722)):
            Rectangle(SKETCH21_W, SKETCH21_H)
    extrude(amount=-BOSS_EXTRUDE10_DEPTH)

    # Sketch22 → Cut-Extrude13 (cut, through all)
    with BuildSketch(Plane(origin=(0, 0, -195.463309991), x_dir=(-1, 0, 0), z_dir=(0, 0, -1))):
        with Locations((-3.365108494, 17.400361313)):
            Rectangle(SKETCH22_W, SKETCH22_H)
    extrude(amount=-CUT_EXTRUDE13_DEPTH, mode=Mode.SUBTRACT)

    # Sketch23 → Cut-Extrude14 (cut, through all)
    with BuildSketch(Plane(origin=(0, 38.1, 0), x_dir=(-1, 0, 0), z_dir=(0, -1, 0))):
        with Locations((-3.365108494, -179.186690009)):
            Rectangle(SKETCH23_W, SKETCH23_H)
        with Locations((-3.365108494, 163.713309991)):
            Rectangle(SKETCH23_W, SKETCH23_H)
    extrude(amount=-CUT_EXTRUDE14_DEPTH, mode=Mode.SUBTRACT)


solid = part.part
